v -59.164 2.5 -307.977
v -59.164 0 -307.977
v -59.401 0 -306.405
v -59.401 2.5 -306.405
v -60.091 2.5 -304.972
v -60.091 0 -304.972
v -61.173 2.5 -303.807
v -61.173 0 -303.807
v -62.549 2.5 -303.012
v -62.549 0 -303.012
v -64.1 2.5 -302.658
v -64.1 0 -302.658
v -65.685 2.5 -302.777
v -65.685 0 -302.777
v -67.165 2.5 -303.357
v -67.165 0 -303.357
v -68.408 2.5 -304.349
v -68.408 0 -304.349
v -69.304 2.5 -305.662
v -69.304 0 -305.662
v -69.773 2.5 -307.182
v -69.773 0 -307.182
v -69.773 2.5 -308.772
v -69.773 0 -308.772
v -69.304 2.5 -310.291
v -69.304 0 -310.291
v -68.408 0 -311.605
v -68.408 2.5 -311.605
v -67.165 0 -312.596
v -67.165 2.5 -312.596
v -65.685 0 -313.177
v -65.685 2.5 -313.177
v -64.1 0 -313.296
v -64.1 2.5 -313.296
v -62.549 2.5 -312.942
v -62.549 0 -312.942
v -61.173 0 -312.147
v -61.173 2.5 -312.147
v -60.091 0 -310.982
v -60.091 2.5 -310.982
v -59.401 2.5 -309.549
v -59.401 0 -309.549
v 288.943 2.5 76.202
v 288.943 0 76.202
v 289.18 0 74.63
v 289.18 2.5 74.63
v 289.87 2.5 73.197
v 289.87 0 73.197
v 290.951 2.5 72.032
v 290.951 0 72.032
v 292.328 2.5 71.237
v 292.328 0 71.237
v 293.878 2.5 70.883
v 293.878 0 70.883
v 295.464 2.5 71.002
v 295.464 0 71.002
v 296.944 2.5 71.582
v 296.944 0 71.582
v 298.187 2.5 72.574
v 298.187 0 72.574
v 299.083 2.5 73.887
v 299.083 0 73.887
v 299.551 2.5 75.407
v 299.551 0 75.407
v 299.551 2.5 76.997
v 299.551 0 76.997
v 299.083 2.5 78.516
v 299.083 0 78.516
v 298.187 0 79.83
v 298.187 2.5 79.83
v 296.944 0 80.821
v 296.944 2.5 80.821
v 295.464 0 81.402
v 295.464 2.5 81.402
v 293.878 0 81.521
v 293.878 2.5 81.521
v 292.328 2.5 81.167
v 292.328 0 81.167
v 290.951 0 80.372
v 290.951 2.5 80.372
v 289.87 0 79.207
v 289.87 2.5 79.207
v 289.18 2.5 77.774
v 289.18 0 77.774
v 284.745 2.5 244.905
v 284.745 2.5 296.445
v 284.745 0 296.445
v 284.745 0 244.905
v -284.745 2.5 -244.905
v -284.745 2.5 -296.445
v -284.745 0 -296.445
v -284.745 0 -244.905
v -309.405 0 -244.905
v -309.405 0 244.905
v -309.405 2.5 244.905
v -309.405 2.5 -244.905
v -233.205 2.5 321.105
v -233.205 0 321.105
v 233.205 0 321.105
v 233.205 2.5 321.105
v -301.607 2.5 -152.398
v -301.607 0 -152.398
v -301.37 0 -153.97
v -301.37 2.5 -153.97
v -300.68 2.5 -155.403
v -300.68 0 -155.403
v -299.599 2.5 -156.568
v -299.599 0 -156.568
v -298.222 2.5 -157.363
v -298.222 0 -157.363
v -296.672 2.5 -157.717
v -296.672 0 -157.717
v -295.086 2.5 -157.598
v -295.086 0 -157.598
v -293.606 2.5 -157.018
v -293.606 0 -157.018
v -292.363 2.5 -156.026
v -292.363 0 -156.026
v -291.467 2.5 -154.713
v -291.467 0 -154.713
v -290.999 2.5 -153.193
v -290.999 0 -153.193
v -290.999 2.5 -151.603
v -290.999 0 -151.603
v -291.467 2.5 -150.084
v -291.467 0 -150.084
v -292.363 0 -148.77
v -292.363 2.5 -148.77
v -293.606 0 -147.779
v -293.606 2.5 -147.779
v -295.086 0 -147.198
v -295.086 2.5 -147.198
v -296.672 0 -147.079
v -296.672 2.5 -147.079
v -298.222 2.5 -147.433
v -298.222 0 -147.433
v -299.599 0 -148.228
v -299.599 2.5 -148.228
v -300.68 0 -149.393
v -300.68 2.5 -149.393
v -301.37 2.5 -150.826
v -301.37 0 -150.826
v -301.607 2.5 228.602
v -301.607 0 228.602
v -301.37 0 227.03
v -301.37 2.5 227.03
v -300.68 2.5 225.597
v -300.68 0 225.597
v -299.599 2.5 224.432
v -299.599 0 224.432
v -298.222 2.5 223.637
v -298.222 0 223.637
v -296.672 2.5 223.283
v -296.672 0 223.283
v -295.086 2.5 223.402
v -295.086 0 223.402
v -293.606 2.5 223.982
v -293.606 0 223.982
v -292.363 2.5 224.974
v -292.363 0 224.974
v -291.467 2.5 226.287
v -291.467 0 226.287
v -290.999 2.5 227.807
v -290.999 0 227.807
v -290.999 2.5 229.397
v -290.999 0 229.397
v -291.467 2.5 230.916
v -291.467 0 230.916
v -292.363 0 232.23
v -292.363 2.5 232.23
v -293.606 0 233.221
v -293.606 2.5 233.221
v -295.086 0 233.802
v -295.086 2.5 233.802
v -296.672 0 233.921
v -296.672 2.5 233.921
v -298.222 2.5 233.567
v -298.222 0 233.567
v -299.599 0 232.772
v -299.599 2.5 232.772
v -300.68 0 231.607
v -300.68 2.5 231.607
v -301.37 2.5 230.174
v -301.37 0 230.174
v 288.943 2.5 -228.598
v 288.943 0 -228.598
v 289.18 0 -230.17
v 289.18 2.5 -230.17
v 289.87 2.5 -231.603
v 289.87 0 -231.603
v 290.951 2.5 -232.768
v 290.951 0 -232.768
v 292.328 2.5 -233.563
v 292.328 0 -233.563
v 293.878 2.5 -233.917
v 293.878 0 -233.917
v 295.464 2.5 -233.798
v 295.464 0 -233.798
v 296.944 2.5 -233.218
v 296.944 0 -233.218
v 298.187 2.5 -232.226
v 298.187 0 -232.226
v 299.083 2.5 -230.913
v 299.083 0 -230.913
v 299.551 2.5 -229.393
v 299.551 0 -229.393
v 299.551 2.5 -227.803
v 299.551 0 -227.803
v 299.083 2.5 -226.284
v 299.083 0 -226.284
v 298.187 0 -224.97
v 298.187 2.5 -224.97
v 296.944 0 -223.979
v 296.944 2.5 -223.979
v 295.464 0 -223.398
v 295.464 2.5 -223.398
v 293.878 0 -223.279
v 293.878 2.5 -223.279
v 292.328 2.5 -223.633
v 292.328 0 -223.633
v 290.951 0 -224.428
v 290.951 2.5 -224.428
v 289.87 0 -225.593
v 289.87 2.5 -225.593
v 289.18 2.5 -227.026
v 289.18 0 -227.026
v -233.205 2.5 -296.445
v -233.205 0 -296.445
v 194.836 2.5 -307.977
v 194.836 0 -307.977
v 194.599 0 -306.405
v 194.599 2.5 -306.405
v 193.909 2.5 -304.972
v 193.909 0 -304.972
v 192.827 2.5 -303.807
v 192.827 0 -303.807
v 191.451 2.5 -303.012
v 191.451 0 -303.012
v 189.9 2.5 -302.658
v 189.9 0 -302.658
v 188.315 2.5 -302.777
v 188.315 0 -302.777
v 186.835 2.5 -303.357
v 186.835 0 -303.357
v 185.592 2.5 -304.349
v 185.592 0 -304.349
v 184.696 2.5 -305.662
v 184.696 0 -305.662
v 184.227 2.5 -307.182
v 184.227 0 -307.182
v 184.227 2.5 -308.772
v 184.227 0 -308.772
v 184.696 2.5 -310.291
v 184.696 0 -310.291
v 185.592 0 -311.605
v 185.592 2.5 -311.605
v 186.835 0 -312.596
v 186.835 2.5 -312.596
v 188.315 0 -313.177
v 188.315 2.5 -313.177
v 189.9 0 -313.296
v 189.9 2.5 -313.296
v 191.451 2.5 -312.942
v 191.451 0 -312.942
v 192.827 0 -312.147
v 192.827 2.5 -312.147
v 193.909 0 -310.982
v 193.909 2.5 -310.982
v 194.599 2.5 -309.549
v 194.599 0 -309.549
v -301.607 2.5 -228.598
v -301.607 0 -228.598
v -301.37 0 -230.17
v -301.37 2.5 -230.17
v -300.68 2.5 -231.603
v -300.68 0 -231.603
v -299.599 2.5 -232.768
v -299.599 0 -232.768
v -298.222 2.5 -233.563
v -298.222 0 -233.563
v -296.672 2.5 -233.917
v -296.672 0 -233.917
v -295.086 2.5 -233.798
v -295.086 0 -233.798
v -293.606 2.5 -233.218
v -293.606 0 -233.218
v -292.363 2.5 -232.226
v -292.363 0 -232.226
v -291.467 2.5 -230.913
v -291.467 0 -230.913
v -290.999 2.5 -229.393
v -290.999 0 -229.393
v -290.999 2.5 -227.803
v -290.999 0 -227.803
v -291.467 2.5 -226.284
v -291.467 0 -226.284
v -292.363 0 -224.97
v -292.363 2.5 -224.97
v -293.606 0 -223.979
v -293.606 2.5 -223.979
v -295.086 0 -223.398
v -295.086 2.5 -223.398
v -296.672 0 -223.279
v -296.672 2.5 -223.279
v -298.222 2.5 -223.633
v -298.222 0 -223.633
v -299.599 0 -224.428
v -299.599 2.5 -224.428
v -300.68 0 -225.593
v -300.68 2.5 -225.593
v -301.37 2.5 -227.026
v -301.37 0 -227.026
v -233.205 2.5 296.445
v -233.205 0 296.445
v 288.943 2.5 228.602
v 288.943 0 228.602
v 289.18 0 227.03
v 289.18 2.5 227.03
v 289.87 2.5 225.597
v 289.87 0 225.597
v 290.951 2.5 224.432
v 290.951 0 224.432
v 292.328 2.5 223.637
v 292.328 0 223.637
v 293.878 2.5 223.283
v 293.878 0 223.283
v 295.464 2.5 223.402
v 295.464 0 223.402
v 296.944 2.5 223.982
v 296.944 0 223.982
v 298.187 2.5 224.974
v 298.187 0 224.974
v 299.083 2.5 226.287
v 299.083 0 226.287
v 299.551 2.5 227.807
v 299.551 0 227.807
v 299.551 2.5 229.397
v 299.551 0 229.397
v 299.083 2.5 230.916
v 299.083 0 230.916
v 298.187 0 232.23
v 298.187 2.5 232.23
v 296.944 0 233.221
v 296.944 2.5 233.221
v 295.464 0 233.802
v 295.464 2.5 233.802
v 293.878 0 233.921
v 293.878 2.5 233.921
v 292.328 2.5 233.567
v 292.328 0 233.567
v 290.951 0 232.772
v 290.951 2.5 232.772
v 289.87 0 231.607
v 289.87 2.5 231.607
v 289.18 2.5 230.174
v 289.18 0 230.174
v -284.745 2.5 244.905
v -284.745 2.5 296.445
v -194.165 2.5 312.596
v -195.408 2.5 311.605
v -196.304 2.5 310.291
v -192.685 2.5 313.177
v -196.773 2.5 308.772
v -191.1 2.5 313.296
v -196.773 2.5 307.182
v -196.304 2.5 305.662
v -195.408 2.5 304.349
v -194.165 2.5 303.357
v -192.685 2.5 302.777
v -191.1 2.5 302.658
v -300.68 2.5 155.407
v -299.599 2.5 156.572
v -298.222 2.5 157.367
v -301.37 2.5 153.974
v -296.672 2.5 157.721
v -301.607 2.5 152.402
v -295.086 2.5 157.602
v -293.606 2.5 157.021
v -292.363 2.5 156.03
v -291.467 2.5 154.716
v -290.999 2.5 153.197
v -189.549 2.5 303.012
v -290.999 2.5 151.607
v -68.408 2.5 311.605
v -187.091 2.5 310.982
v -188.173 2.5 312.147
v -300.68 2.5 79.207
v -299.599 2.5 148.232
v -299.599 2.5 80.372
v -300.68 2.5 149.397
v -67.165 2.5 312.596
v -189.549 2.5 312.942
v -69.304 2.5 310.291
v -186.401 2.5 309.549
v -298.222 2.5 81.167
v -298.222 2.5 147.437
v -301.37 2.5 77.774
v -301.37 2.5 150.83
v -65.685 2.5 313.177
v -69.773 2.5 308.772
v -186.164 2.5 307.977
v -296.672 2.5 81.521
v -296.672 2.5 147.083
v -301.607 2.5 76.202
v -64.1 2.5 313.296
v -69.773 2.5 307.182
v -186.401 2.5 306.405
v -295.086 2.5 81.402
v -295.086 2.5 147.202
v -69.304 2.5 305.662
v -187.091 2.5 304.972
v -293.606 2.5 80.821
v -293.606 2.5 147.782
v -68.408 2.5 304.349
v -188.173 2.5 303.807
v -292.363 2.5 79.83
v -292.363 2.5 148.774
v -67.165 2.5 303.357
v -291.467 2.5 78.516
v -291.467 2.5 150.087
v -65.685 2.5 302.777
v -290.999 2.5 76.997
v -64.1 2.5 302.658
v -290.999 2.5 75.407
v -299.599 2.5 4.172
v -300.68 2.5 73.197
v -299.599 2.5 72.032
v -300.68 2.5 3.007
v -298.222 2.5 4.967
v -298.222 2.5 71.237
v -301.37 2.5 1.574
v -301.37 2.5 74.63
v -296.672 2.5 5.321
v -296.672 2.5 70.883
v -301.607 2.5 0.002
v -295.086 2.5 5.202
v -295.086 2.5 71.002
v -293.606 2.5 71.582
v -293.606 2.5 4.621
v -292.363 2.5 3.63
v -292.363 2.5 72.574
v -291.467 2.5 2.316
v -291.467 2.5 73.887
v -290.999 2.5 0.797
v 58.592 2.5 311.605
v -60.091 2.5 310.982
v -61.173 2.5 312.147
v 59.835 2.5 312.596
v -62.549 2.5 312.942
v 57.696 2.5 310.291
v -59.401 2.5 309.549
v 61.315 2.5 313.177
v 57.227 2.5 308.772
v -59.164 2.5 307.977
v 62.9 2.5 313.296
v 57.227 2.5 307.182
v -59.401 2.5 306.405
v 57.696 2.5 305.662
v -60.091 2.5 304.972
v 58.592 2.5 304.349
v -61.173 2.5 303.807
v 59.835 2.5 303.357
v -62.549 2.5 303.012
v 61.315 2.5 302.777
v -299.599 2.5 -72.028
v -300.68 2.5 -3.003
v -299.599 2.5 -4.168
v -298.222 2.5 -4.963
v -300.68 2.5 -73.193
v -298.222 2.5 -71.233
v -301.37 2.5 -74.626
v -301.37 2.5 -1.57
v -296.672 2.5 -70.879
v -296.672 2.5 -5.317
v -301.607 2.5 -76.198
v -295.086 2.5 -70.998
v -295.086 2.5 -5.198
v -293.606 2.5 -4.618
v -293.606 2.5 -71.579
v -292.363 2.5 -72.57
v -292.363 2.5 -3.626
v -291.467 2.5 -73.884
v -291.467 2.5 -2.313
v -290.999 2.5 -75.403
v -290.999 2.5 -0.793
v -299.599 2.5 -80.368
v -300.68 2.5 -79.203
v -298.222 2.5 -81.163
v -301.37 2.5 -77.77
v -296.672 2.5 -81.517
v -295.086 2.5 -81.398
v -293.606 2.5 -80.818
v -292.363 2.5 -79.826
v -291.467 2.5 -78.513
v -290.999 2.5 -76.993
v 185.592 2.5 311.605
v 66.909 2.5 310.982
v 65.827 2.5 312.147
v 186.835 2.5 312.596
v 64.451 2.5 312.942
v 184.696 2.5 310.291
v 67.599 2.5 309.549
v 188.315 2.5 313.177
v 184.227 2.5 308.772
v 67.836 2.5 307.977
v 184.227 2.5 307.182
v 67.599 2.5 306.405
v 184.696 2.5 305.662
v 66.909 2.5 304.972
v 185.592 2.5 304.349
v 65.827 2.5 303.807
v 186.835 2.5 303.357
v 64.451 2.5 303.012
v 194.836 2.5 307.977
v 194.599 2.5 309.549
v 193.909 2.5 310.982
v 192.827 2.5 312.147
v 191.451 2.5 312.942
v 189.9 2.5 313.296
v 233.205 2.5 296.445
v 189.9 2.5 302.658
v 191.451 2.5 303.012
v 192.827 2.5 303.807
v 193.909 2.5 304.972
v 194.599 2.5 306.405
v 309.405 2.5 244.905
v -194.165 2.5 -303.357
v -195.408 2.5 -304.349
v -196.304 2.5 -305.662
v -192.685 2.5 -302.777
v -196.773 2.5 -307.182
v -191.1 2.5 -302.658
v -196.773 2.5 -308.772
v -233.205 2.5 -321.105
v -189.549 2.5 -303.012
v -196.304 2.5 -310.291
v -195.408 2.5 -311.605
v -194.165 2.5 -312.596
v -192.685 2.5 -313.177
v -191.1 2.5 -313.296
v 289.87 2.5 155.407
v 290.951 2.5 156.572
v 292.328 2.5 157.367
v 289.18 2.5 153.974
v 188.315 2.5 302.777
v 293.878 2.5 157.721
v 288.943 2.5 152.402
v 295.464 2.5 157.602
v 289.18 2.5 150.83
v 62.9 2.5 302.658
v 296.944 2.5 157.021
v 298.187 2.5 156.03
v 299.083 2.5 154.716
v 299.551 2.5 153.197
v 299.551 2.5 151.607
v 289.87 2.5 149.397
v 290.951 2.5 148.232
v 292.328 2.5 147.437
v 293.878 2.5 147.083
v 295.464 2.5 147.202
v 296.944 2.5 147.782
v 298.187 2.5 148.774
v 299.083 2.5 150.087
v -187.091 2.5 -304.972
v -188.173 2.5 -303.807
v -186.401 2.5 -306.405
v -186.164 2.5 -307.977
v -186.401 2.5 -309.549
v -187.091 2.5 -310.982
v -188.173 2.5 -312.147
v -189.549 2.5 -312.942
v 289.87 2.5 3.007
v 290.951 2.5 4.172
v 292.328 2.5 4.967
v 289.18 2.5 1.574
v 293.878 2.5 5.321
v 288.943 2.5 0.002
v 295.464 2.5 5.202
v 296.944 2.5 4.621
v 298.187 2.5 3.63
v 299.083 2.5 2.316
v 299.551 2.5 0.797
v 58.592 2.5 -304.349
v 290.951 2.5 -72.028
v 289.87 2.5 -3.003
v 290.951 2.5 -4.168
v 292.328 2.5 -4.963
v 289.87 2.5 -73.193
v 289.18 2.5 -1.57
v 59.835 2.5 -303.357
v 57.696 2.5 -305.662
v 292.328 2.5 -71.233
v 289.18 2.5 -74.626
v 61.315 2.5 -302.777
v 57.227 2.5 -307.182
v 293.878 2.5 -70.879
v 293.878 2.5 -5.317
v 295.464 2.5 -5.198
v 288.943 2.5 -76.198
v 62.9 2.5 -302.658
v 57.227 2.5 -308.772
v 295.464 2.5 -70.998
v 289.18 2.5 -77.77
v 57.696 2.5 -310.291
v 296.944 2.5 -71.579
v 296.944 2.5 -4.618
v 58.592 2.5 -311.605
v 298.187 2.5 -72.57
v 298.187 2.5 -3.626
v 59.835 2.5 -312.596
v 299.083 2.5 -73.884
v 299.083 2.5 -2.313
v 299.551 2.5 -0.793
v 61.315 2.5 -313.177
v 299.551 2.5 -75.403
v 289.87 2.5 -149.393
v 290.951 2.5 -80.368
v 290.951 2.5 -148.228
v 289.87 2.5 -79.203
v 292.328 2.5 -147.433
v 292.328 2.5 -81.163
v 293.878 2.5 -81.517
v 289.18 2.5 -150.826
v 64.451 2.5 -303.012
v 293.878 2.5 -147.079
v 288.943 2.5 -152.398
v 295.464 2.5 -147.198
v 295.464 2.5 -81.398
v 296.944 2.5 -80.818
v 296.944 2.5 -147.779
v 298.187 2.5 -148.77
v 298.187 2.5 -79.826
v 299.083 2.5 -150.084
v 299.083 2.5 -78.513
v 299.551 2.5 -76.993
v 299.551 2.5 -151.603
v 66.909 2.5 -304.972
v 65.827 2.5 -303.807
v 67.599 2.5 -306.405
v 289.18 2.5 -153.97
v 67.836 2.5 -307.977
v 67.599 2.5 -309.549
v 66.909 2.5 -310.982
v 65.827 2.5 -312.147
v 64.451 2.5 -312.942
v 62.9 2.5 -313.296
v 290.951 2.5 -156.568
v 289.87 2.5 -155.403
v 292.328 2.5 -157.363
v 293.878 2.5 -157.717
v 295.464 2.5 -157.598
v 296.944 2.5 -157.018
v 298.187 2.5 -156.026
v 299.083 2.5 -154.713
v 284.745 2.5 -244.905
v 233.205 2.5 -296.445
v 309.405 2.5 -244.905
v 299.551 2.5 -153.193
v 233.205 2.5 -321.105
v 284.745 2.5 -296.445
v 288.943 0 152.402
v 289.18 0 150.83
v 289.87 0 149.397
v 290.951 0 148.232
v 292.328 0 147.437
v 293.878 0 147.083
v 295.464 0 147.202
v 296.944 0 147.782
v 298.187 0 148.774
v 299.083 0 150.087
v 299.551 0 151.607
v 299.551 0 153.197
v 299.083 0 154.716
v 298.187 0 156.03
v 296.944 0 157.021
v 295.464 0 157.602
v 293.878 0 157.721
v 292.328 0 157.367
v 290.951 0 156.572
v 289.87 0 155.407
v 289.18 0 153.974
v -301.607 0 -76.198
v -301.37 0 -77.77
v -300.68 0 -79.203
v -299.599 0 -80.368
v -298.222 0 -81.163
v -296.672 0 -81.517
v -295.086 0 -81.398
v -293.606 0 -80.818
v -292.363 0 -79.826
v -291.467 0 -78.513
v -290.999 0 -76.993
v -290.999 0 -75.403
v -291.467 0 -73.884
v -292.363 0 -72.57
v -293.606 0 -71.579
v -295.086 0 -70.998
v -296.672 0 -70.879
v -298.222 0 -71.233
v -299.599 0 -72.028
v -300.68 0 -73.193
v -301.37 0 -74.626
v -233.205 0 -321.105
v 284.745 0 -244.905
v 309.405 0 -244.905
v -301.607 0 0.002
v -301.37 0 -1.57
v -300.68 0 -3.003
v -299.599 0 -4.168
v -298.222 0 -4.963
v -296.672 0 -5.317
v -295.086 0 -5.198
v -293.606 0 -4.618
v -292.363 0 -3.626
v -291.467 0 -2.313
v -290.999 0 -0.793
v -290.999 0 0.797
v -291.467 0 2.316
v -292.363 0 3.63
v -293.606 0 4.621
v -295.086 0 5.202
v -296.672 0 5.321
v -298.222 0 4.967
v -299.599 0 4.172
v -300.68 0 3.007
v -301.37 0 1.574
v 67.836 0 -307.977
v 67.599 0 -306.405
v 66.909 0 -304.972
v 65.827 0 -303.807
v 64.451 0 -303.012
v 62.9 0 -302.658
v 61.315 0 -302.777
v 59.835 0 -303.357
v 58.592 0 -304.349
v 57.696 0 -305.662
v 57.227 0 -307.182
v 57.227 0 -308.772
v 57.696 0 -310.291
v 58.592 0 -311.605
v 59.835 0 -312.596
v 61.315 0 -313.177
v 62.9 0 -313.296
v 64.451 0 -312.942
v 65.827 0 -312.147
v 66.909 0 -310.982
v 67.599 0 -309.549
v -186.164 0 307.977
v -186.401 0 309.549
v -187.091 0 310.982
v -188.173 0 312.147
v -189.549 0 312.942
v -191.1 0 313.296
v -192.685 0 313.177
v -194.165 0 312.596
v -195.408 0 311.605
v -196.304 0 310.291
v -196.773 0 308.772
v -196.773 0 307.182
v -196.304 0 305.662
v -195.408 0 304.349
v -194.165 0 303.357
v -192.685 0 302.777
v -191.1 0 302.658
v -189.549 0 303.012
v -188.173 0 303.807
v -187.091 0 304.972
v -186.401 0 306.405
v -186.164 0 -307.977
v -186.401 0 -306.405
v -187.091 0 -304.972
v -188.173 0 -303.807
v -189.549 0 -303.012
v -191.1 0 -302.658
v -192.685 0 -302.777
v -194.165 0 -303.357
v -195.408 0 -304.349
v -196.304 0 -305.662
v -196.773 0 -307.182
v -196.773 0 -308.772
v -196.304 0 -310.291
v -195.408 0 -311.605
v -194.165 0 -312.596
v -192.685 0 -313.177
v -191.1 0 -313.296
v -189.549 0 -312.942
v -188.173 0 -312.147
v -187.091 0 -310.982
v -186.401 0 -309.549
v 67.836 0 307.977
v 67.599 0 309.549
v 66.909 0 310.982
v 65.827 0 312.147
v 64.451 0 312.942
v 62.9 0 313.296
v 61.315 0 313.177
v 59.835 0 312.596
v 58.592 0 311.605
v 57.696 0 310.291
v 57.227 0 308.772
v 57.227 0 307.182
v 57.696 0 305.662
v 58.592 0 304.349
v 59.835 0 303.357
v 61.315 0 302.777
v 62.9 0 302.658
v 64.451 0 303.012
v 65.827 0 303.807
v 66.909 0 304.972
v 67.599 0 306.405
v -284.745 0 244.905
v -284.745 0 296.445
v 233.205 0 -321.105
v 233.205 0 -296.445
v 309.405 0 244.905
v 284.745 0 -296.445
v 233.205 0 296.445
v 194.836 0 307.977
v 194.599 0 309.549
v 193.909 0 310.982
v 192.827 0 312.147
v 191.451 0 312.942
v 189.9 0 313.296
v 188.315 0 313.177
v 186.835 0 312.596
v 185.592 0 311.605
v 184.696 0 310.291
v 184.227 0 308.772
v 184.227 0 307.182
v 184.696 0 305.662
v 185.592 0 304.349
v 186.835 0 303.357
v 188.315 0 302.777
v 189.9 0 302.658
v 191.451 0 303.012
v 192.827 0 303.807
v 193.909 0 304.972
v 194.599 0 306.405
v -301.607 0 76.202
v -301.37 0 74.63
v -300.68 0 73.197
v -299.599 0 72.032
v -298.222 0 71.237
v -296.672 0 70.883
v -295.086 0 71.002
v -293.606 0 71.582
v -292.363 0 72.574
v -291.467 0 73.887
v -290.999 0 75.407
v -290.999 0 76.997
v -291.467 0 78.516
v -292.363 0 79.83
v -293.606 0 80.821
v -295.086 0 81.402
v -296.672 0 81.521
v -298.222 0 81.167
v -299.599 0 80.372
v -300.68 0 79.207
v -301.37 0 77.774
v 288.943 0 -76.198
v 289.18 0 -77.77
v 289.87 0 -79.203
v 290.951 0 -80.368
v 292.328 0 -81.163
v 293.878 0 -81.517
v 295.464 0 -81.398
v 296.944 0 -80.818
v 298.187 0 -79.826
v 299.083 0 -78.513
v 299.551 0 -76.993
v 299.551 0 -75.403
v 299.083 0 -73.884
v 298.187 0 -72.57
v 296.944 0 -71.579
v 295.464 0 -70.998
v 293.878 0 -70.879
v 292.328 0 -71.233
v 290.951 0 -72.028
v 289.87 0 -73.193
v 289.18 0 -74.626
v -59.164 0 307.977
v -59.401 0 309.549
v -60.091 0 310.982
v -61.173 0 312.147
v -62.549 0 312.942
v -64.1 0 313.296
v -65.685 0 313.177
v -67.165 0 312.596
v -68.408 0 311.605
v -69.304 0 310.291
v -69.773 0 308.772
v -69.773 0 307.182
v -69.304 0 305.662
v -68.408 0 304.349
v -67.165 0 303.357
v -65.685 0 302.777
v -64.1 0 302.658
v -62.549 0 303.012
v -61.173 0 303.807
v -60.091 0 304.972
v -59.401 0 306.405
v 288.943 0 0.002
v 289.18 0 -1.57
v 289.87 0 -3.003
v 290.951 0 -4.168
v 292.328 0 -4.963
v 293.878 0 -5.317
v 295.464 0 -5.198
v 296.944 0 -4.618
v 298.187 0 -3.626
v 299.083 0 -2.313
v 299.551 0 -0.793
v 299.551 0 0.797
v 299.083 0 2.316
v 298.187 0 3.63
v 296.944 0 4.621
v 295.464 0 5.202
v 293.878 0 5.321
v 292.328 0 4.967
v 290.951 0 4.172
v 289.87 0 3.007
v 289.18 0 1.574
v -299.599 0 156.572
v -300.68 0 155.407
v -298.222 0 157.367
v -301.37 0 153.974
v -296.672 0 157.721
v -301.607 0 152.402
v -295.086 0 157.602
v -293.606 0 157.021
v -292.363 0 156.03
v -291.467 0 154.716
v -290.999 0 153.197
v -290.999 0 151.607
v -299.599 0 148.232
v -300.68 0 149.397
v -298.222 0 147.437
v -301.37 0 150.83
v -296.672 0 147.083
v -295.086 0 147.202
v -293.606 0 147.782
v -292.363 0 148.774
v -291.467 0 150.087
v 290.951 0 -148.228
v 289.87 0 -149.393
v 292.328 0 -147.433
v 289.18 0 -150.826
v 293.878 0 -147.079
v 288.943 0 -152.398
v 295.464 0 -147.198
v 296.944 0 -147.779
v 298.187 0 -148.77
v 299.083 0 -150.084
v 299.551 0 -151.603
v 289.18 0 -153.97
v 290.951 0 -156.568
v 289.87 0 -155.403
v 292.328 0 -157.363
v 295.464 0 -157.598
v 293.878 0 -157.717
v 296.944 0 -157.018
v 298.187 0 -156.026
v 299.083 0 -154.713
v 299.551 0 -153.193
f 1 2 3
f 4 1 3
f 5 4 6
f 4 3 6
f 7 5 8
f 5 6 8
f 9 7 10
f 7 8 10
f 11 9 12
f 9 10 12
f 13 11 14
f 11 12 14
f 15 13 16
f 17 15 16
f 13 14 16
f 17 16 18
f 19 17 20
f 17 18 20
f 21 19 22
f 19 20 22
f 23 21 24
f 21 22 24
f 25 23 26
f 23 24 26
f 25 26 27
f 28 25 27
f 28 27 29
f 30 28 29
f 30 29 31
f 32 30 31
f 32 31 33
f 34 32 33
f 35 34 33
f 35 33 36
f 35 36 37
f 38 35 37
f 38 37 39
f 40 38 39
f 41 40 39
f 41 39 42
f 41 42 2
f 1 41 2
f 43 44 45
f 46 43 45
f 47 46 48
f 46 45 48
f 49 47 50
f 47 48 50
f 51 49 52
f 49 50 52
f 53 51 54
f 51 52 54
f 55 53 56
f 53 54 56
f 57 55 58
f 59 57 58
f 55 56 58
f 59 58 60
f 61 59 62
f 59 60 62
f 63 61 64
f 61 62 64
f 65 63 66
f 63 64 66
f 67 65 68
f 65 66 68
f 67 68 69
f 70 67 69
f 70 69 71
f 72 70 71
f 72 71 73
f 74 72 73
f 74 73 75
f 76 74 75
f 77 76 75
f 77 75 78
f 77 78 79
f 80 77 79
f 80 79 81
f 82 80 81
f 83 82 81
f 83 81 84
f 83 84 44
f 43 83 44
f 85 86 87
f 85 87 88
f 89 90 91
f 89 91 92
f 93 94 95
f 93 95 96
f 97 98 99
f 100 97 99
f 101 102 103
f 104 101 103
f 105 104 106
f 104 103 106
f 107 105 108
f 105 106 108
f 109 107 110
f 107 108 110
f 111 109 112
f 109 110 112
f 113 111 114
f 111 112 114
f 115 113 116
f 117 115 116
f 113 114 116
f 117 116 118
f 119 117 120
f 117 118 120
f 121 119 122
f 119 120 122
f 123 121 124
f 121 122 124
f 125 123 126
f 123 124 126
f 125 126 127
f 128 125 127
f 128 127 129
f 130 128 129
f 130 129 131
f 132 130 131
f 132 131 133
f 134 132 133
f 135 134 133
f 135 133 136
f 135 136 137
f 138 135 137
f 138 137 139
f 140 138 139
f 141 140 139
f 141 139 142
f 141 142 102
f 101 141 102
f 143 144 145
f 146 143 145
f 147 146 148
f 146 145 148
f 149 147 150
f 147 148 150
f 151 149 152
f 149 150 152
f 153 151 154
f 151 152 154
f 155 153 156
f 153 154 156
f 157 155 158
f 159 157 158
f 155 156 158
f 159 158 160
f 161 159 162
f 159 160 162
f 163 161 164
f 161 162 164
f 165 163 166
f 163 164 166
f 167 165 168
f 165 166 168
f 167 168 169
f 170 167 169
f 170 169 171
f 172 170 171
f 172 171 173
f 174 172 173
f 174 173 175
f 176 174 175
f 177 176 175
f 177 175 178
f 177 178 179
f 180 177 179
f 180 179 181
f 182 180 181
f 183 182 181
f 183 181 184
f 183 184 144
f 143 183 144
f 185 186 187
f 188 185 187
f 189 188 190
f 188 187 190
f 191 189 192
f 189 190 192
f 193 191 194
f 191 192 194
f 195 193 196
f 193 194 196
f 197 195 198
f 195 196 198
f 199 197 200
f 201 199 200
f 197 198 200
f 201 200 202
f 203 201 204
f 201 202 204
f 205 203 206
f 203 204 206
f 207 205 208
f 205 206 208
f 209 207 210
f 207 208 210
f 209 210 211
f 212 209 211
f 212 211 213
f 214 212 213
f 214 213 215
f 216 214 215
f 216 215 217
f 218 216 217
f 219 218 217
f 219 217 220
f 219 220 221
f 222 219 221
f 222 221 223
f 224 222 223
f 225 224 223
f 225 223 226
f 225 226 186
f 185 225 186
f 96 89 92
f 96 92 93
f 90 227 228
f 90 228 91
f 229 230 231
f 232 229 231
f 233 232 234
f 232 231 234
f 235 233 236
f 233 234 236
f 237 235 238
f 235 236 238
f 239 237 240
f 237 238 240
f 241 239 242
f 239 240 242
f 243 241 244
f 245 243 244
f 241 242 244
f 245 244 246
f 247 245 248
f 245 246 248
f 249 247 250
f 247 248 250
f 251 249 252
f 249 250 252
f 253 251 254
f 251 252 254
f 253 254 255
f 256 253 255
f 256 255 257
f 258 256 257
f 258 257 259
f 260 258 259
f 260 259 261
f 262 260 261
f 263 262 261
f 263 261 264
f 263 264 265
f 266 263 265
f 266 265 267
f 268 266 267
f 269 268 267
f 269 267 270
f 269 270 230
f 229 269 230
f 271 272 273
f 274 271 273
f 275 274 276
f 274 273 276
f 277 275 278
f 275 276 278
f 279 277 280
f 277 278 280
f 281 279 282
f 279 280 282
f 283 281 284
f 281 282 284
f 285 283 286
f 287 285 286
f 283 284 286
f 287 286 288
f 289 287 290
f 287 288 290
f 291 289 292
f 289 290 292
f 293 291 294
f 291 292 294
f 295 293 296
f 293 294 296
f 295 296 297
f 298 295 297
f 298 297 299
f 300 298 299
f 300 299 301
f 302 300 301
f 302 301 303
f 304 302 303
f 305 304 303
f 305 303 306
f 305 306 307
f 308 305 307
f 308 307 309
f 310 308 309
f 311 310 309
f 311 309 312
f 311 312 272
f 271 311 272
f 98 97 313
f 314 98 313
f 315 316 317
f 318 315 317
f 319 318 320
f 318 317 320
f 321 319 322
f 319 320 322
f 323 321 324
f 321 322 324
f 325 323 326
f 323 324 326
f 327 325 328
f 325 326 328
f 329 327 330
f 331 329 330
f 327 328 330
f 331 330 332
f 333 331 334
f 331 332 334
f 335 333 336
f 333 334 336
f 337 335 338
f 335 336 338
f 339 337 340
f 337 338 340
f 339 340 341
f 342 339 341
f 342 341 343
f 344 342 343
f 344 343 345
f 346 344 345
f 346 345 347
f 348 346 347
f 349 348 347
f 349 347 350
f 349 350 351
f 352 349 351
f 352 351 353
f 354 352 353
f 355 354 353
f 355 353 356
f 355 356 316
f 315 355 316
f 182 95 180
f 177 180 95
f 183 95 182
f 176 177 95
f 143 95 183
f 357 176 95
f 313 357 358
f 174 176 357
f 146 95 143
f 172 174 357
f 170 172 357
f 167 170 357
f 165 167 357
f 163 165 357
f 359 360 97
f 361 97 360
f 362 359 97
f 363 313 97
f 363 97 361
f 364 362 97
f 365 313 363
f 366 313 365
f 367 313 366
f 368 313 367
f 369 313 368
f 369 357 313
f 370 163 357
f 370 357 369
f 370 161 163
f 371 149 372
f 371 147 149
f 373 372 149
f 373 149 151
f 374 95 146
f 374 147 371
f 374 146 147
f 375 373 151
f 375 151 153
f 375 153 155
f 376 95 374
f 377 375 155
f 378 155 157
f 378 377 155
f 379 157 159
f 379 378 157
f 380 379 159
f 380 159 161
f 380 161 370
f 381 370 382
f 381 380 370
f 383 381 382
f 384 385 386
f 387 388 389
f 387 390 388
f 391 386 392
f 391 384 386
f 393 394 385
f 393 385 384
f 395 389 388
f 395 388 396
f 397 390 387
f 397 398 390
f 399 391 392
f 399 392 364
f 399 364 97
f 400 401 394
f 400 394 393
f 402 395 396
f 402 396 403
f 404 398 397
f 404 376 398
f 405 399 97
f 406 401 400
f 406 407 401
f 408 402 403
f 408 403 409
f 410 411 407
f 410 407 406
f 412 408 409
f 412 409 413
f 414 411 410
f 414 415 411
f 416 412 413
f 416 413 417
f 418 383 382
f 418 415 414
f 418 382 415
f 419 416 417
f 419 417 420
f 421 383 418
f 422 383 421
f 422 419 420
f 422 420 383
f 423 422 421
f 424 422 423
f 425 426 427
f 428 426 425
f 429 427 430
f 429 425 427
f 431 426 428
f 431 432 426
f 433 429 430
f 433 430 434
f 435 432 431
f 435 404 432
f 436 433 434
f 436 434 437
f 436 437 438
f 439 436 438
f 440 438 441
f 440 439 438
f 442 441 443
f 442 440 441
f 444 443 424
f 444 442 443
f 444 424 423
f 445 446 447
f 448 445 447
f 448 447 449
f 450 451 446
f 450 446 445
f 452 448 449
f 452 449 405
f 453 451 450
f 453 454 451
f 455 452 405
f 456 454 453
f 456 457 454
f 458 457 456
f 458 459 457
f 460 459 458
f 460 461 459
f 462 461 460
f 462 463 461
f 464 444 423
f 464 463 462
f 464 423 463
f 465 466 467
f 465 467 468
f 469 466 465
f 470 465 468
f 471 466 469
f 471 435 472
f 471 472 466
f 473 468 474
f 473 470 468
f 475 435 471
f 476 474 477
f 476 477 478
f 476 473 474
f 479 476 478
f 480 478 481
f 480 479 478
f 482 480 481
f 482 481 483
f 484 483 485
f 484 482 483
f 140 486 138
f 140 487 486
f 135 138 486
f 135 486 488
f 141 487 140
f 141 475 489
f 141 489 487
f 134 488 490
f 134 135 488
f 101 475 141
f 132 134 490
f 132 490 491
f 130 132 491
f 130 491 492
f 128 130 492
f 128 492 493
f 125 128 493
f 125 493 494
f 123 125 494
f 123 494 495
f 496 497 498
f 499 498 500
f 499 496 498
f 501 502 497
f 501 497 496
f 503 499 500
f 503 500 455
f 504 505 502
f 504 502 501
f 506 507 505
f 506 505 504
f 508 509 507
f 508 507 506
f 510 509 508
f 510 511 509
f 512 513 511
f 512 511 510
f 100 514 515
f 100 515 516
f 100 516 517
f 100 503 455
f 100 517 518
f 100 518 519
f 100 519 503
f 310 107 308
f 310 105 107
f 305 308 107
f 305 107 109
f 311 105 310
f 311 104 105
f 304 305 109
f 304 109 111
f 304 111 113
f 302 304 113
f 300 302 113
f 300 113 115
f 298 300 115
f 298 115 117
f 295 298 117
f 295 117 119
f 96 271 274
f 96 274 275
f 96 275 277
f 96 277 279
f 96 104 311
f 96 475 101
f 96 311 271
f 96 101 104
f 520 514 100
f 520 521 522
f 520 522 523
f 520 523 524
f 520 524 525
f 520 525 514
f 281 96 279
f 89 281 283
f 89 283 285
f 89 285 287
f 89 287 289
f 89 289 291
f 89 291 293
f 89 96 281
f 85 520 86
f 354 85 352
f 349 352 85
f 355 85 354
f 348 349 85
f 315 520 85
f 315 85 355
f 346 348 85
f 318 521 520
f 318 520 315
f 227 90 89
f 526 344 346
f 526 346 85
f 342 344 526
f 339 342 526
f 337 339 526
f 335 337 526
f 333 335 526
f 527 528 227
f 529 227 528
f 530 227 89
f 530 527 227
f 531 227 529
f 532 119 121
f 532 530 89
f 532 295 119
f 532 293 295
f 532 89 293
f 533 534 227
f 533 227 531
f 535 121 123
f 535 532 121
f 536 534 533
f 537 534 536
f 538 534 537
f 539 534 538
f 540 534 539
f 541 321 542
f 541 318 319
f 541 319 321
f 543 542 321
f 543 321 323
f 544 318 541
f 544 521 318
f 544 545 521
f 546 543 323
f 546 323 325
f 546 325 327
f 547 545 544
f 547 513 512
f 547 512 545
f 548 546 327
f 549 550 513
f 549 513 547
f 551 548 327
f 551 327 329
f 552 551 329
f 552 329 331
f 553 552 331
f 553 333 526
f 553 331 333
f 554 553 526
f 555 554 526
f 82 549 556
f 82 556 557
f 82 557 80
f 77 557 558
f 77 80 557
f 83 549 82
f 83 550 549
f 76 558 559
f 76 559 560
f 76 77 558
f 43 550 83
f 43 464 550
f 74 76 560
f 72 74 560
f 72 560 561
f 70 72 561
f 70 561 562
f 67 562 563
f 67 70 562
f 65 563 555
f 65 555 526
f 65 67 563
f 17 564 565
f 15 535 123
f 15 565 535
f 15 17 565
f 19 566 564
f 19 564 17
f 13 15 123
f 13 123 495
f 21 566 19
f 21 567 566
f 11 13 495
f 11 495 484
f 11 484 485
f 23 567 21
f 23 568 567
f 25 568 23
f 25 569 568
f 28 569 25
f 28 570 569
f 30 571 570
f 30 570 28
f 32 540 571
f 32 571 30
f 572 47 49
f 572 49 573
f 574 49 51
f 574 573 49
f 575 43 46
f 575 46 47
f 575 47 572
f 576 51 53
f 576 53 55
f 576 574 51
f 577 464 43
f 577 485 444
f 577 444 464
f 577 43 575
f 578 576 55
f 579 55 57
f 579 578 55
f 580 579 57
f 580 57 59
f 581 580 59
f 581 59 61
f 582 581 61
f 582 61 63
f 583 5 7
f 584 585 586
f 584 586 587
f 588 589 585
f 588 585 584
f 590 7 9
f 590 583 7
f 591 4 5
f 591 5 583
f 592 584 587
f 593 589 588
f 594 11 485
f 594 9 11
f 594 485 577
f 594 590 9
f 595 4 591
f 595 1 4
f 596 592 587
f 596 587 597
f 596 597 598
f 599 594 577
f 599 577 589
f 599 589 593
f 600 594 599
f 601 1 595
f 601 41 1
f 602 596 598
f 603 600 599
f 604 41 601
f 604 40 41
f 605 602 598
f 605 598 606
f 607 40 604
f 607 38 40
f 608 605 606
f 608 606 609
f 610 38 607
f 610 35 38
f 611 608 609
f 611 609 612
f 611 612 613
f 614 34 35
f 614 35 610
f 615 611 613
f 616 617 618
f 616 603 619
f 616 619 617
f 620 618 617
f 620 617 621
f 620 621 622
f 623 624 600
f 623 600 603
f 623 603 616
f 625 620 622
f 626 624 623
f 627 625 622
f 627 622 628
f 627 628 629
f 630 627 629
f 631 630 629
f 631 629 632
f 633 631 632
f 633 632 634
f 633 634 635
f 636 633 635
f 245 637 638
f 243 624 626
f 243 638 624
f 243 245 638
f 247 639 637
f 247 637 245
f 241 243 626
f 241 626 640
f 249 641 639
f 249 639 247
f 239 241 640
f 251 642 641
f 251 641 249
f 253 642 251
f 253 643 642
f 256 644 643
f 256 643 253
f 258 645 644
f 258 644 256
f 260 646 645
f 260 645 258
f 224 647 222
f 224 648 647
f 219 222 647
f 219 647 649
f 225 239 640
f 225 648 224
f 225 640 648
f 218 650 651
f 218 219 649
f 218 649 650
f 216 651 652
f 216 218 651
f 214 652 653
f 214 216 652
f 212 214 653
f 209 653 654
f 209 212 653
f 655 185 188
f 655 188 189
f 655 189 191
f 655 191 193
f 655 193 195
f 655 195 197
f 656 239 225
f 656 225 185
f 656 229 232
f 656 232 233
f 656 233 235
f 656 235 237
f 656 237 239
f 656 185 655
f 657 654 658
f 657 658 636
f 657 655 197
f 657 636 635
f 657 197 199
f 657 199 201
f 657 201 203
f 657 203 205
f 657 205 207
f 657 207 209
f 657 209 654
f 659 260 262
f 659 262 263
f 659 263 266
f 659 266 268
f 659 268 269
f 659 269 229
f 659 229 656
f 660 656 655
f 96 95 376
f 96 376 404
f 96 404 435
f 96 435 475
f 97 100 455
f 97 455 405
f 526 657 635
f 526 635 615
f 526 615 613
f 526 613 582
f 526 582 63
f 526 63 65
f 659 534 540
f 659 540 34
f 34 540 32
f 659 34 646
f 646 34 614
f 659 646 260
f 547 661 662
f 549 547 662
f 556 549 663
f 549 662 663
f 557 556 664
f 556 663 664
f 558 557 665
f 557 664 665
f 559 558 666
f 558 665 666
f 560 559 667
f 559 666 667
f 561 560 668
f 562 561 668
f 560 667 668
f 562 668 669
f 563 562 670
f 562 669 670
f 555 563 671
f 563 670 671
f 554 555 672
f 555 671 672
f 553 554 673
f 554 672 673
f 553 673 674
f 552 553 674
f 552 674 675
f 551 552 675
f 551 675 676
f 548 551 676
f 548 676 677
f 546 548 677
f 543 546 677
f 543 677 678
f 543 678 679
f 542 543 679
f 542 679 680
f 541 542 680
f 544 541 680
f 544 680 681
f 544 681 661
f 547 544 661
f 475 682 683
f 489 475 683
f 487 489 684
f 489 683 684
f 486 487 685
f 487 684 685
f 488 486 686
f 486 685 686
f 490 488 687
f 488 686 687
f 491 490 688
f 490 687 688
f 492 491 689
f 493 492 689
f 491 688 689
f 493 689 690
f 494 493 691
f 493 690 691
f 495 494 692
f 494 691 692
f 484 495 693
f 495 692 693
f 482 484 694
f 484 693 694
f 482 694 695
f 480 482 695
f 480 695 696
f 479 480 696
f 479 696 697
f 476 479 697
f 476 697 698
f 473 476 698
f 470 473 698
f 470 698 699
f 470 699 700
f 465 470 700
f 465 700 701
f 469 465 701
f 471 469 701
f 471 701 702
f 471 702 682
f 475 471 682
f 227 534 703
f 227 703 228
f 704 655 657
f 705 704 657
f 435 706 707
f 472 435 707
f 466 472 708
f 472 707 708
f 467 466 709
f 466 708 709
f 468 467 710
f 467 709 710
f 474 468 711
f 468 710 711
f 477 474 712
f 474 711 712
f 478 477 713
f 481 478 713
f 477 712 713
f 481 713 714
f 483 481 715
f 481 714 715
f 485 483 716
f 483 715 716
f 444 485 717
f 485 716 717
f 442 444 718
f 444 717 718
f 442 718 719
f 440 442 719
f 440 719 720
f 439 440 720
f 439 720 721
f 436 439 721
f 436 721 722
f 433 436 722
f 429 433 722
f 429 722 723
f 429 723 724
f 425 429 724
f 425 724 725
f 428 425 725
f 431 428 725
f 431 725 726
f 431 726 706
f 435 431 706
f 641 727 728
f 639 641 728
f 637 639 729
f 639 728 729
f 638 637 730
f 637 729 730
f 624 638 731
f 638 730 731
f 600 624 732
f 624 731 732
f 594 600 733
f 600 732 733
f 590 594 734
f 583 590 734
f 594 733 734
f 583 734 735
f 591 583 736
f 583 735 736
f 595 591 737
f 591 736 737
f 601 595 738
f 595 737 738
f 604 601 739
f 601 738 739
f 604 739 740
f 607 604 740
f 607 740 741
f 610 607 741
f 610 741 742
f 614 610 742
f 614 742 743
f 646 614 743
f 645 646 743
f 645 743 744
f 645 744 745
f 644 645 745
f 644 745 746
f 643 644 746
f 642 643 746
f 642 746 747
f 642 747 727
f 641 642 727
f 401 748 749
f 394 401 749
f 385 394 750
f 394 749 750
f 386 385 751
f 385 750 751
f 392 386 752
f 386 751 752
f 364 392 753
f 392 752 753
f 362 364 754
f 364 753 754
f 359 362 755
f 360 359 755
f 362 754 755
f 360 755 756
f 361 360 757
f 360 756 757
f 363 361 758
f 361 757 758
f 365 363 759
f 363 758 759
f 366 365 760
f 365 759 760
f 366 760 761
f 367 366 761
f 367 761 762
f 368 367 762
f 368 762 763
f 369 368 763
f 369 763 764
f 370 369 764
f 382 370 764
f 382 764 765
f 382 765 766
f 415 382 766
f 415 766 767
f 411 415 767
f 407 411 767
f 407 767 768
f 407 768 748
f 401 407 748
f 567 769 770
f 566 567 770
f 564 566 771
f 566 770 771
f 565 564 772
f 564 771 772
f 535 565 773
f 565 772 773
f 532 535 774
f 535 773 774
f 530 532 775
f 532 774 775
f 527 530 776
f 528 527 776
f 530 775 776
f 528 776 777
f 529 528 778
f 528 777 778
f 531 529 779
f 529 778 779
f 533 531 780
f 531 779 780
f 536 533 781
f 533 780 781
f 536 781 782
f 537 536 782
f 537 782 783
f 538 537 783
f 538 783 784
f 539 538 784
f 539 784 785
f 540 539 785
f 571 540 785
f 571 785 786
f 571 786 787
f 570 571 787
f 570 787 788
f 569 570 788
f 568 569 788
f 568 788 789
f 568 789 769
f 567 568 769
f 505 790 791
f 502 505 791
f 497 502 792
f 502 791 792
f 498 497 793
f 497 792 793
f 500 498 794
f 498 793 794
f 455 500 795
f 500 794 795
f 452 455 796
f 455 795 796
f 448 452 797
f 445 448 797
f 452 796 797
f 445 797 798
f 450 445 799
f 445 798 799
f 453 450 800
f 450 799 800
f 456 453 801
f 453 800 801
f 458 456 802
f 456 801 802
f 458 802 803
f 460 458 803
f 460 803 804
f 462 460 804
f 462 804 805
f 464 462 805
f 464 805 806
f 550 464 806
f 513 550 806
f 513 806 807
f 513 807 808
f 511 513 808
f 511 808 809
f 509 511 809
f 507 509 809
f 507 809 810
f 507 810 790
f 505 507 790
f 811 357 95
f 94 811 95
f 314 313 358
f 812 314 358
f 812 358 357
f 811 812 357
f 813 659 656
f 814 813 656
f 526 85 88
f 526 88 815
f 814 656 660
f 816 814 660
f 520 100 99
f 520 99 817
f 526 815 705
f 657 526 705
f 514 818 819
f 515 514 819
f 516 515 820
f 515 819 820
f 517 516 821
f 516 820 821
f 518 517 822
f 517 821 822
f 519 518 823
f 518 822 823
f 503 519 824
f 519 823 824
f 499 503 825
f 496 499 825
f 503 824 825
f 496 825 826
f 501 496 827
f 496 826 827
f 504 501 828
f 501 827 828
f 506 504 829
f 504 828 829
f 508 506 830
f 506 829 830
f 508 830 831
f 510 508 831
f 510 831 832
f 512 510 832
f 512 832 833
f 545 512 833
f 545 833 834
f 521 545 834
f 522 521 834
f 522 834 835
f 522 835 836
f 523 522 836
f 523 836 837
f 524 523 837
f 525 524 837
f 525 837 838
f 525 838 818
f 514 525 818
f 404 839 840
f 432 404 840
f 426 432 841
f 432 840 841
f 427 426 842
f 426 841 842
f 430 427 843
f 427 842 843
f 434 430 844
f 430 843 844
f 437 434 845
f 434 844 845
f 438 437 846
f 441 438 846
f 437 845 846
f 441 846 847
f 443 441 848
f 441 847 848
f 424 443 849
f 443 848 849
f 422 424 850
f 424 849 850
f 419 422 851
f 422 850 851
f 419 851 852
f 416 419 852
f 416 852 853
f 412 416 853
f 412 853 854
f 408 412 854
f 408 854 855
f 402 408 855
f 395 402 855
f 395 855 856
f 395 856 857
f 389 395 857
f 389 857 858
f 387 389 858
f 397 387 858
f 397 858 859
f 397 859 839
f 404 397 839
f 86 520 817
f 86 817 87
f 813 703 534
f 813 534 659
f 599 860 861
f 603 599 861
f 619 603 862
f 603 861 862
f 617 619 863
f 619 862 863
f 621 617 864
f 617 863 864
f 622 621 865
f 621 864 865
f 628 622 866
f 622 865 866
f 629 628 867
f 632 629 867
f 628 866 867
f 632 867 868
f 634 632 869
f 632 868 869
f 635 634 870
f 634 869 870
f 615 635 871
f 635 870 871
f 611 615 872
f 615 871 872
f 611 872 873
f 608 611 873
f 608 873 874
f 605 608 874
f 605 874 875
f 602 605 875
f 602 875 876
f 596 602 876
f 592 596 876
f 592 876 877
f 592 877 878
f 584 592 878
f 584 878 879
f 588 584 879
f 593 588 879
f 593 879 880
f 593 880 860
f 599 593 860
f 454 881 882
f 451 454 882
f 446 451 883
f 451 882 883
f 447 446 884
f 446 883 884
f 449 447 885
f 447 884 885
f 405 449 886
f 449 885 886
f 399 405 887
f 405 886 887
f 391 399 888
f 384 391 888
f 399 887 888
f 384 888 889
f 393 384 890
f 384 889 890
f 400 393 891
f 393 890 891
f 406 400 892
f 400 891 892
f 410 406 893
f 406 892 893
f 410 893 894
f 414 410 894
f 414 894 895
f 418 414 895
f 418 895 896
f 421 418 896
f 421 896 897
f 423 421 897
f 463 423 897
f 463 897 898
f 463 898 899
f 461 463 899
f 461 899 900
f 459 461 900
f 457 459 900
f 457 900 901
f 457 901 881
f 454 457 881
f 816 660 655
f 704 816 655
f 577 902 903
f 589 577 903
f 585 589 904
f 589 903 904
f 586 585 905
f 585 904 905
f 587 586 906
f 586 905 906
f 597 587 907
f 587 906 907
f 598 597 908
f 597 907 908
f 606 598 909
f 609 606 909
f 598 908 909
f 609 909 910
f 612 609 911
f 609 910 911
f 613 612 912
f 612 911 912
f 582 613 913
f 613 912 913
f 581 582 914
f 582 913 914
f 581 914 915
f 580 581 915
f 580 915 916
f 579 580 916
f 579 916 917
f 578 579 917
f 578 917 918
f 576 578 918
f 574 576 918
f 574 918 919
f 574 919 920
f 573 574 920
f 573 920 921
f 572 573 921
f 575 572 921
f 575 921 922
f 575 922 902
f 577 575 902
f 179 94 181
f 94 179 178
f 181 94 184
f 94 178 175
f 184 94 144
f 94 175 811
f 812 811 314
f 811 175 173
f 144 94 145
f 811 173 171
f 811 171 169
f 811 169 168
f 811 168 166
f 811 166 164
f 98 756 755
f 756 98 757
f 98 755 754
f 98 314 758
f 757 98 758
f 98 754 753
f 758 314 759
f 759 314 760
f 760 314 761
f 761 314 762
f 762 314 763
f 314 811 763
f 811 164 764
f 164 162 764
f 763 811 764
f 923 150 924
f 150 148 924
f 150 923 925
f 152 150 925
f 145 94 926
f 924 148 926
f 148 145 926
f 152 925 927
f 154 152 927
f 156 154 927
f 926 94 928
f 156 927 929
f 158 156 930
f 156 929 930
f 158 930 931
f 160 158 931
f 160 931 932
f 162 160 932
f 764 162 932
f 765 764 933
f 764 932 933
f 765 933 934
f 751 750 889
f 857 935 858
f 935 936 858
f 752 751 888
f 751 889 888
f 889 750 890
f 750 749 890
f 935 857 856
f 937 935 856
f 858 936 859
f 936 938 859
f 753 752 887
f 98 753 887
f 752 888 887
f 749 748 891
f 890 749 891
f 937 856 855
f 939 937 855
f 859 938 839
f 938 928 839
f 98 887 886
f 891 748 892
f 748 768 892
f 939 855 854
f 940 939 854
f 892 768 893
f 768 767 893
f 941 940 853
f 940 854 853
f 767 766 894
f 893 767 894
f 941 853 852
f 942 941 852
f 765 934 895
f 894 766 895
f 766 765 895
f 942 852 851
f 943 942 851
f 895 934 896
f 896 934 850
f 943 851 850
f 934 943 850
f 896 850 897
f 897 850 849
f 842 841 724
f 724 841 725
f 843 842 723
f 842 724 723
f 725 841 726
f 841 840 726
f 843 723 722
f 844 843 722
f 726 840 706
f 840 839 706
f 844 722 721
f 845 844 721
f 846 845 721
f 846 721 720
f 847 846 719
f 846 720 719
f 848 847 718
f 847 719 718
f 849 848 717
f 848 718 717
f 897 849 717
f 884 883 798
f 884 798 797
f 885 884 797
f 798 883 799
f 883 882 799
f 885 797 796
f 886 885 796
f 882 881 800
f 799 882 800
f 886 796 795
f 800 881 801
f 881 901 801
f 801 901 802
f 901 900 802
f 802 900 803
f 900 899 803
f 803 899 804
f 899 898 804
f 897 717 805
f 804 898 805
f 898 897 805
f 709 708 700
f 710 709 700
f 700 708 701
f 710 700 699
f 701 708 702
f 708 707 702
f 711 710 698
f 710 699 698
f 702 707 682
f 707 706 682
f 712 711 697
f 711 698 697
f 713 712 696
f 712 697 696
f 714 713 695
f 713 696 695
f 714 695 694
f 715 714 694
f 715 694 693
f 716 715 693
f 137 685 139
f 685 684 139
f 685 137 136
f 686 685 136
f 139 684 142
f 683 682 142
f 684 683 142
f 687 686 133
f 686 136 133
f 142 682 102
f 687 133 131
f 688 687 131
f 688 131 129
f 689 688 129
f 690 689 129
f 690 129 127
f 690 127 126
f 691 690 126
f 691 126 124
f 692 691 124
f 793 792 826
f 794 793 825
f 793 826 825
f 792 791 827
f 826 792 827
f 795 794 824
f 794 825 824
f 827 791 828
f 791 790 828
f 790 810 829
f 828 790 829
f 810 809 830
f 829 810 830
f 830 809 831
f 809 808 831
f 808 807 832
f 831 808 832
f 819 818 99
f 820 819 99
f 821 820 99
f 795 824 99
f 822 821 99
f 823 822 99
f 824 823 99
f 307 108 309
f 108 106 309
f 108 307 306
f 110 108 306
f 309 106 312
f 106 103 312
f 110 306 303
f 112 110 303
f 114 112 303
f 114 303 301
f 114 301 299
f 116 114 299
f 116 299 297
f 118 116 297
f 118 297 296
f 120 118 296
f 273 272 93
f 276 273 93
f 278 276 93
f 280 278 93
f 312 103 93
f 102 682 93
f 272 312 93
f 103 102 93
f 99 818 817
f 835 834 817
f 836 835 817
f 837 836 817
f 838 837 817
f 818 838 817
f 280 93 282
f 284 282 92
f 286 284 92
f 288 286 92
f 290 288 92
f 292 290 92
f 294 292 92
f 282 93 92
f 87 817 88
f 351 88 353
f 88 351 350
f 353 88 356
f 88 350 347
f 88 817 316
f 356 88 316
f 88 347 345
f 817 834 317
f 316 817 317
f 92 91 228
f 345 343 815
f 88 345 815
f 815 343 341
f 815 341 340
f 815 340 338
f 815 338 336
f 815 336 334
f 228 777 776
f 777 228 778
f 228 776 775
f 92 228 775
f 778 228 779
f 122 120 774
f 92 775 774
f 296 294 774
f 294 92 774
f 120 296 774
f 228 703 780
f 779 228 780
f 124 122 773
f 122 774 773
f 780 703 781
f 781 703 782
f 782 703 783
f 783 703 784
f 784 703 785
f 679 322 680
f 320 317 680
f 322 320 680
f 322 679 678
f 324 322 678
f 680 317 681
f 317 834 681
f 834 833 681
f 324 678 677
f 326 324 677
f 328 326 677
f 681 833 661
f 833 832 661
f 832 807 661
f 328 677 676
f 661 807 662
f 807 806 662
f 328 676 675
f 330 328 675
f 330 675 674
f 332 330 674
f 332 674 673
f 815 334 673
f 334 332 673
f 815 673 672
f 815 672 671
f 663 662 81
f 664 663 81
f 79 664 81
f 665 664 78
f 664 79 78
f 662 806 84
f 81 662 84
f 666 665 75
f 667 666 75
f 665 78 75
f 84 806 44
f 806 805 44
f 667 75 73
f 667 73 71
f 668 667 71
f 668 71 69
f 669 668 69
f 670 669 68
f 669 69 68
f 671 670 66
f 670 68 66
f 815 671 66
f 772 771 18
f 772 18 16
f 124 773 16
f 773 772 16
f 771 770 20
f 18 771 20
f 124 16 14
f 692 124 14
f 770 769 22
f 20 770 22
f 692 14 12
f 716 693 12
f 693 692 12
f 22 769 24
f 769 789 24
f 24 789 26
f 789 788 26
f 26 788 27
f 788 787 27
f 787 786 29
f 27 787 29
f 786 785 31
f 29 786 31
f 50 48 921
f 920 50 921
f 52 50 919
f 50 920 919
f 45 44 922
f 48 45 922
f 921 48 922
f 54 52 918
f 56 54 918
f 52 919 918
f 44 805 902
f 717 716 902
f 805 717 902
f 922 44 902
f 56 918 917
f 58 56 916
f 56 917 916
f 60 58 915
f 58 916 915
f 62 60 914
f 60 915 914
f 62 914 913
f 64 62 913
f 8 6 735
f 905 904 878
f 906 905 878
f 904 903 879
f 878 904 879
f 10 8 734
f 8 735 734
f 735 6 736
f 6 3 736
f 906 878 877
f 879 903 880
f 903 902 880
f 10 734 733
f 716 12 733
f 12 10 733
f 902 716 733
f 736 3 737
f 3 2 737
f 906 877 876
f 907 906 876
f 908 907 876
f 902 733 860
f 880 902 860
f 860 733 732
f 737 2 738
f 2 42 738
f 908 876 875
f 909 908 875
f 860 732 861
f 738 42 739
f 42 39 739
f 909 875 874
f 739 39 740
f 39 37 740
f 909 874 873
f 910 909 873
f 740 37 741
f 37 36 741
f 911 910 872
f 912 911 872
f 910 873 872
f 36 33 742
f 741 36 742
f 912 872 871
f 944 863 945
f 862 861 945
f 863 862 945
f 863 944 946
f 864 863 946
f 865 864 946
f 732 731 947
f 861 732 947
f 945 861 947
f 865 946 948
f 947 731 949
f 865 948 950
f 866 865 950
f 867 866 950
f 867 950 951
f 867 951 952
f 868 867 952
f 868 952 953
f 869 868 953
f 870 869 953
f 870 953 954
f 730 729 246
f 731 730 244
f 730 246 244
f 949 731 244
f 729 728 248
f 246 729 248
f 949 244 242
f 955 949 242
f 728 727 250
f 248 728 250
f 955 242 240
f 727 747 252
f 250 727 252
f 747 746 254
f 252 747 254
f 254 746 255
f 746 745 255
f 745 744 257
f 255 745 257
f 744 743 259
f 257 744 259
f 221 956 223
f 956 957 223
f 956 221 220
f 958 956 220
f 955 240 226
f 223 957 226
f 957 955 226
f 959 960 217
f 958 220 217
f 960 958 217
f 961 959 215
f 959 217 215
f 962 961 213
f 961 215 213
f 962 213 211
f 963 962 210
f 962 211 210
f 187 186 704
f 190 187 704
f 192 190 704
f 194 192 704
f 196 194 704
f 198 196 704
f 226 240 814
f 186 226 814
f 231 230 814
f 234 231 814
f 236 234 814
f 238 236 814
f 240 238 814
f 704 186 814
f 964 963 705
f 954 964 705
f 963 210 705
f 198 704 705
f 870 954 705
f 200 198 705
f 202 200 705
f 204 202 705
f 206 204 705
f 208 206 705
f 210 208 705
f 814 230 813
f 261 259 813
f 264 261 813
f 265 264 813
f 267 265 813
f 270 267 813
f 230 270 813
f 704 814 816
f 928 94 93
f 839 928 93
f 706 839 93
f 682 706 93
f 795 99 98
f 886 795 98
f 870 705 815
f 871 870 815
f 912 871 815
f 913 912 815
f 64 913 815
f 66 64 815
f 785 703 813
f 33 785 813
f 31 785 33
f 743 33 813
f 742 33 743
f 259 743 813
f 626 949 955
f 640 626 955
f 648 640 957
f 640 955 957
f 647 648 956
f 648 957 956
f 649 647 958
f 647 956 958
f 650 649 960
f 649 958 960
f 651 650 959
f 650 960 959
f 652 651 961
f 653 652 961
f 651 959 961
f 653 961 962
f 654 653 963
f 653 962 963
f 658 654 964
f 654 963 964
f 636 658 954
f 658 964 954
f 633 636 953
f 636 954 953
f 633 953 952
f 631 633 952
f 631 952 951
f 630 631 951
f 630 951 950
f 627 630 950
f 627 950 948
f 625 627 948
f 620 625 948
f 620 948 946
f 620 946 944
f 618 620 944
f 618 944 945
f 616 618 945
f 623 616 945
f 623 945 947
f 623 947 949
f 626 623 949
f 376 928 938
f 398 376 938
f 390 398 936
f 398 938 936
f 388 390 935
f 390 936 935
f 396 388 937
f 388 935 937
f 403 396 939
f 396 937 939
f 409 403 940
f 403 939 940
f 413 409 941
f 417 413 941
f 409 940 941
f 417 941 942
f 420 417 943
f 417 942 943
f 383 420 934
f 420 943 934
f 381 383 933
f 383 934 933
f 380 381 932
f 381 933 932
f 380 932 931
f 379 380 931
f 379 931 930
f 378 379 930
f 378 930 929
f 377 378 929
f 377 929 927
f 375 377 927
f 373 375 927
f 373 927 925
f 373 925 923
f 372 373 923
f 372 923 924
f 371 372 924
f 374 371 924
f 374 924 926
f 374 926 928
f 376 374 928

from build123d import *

# Parameters (mm, degrees)
SKETCH1_W           = 618.81
SKETCH1_H           = 642.21
BOSS_EXTRUDE1_DEPTH = 2.5
CUT_EXTRUDE1_DEPTH  = 2.5
SKETCH3_R           = 5.334
CUT_EXTRUDE2_DEPTH  = 10
SKETCH4_R           = 5.334
CUT_EXTRUDE3_DEPTH  = 10


with BuildPart() as part:
    # Sketch1 → Boss-Extrude1 (new body)
    with BuildSketch(Plane(origin=(0, 0, 0), x_dir=(1, 0, 0), z_dir=(0, 1, 0))):
        Rectangle(SKETCH1_W, SKETCH1_H)
    extrude(amount=BOSS_EXTRUDE1_DEPTH)

    # Sketch2 → Cut-Extrude1 (cut)
    with BuildSketch(Plane(origin=(0, 2.5, 0), x_dir=(1, 0, 0), z_dir=(0, 1, 0))):
        Polygon((-309.405, 321.105), (-233.205, 321.105), (-233.205, 296.445), (-284.745, 296.445), (-284.745, 244.905), (-309.405, 244.905), align=None)
        Polygon((-284.745, -244.905), (-309.405, -244.905), (-309.405, -321.105), (-233.205, -321.105), (-233.205, -296.445), (-284.745, -296.445), align=None)
        Polygon((284.745, -296.445), (284.745, -244.905), (309.405, -244.905), (309.405, -321.105), (233.205, -321.105), (233.205, -296.445), align=None)
        Polygon((284.745, 244.905), (309.405, 244.905), (309.405, 321.105), (233.205, 321.105), (233.205, 296.445), (284.745, 296.445), align=None)
    extrude(amount=-CUT_EXTRUDE1_DEPTH, mode=Mode.SUBTRACT)

    # Sketch3 → Cut-Extrude2 (cut)
    with BuildSketch(Plane(origin=(0, 0, 0), x_dir=(-1, 0, 0), z_dir=(0, -1, 0))):
        with Locations((-294.2768, -228.6018)):
            Circle(SKETCH3_R)
        with Locations((-294.2768, -152.4018)):
            Circle(SKETCH3_R)
        with Locations((-294.2768, -76.2018)):
            Circle(SKETCH3_R)
        with Locations((-294.2768, -0.0018)):
            Circle(SKETCH3_R)
        with Locations((-294.2768, 76.1982)):
            Circle(SKETCH3_R)
        with Locations((-294.2768, 152.3982)):
            Circle(SKETCH3_R)
        with Locations((-294.2768, 228.5982)):
            Circle(SKETCH3_R)
        with Locations((296.2732, -228.6018)):
            Circle(SKETCH3_R)
        with Locations((296.2732, -152.4018)):
            Circle(SKETCH3_R)
        with Locations((296.2732, -76.2018)):
            Circle(SKETCH3_R)
        with Locations((296.2732, -0.0018)):
            Circle(SKETCH3_R)
        with Locations((296.2732, 76.1982)):
            Circle(SKETCH3_R)
        with Locations((296.2732, 152.3982)):
            Circle(SKETCH3_R)
        with Locations((296.2732, 228.5982)):
            Circle(SKETCH3_R)
    extrude(amount=-CUT_EXTRUDE2_DEPTH, mode=Mode.SUBTRACT)

    # Sketch4 → Cut-Extrude3 (cut)
    with BuildSketch(Plane.XZ):
        with Locations((189.5018, 307.9768)):
            Circle(SKETCH4_R)
        with Locations((62.5018, 307.9768)):
            Circle(SKETCH4_R)
        with Locations((-64.4982, 307.9768)):
            Circle(SKETCH4_R)
        with Locations((-191.4982, 307.9768)):
            Circle(SKETCH4_R)
        with Locations((-191.4982, -307.9768)):
            Circle(SKETCH4_R)
        with Locations((-64.4982, -307.9768)):
            Circle(SKETCH4_R)
        with Locations((62.5018, -307.9768)):
            Circle(SKETCH4_R)
        with Locations((189.5018, -307.9768)):
            Circle(SKETCH4_R)
    extrude(amount=-CUT_EXTRUDE3_DEPTH, mode=Mode.SUBTRACT)


solid = part.part
